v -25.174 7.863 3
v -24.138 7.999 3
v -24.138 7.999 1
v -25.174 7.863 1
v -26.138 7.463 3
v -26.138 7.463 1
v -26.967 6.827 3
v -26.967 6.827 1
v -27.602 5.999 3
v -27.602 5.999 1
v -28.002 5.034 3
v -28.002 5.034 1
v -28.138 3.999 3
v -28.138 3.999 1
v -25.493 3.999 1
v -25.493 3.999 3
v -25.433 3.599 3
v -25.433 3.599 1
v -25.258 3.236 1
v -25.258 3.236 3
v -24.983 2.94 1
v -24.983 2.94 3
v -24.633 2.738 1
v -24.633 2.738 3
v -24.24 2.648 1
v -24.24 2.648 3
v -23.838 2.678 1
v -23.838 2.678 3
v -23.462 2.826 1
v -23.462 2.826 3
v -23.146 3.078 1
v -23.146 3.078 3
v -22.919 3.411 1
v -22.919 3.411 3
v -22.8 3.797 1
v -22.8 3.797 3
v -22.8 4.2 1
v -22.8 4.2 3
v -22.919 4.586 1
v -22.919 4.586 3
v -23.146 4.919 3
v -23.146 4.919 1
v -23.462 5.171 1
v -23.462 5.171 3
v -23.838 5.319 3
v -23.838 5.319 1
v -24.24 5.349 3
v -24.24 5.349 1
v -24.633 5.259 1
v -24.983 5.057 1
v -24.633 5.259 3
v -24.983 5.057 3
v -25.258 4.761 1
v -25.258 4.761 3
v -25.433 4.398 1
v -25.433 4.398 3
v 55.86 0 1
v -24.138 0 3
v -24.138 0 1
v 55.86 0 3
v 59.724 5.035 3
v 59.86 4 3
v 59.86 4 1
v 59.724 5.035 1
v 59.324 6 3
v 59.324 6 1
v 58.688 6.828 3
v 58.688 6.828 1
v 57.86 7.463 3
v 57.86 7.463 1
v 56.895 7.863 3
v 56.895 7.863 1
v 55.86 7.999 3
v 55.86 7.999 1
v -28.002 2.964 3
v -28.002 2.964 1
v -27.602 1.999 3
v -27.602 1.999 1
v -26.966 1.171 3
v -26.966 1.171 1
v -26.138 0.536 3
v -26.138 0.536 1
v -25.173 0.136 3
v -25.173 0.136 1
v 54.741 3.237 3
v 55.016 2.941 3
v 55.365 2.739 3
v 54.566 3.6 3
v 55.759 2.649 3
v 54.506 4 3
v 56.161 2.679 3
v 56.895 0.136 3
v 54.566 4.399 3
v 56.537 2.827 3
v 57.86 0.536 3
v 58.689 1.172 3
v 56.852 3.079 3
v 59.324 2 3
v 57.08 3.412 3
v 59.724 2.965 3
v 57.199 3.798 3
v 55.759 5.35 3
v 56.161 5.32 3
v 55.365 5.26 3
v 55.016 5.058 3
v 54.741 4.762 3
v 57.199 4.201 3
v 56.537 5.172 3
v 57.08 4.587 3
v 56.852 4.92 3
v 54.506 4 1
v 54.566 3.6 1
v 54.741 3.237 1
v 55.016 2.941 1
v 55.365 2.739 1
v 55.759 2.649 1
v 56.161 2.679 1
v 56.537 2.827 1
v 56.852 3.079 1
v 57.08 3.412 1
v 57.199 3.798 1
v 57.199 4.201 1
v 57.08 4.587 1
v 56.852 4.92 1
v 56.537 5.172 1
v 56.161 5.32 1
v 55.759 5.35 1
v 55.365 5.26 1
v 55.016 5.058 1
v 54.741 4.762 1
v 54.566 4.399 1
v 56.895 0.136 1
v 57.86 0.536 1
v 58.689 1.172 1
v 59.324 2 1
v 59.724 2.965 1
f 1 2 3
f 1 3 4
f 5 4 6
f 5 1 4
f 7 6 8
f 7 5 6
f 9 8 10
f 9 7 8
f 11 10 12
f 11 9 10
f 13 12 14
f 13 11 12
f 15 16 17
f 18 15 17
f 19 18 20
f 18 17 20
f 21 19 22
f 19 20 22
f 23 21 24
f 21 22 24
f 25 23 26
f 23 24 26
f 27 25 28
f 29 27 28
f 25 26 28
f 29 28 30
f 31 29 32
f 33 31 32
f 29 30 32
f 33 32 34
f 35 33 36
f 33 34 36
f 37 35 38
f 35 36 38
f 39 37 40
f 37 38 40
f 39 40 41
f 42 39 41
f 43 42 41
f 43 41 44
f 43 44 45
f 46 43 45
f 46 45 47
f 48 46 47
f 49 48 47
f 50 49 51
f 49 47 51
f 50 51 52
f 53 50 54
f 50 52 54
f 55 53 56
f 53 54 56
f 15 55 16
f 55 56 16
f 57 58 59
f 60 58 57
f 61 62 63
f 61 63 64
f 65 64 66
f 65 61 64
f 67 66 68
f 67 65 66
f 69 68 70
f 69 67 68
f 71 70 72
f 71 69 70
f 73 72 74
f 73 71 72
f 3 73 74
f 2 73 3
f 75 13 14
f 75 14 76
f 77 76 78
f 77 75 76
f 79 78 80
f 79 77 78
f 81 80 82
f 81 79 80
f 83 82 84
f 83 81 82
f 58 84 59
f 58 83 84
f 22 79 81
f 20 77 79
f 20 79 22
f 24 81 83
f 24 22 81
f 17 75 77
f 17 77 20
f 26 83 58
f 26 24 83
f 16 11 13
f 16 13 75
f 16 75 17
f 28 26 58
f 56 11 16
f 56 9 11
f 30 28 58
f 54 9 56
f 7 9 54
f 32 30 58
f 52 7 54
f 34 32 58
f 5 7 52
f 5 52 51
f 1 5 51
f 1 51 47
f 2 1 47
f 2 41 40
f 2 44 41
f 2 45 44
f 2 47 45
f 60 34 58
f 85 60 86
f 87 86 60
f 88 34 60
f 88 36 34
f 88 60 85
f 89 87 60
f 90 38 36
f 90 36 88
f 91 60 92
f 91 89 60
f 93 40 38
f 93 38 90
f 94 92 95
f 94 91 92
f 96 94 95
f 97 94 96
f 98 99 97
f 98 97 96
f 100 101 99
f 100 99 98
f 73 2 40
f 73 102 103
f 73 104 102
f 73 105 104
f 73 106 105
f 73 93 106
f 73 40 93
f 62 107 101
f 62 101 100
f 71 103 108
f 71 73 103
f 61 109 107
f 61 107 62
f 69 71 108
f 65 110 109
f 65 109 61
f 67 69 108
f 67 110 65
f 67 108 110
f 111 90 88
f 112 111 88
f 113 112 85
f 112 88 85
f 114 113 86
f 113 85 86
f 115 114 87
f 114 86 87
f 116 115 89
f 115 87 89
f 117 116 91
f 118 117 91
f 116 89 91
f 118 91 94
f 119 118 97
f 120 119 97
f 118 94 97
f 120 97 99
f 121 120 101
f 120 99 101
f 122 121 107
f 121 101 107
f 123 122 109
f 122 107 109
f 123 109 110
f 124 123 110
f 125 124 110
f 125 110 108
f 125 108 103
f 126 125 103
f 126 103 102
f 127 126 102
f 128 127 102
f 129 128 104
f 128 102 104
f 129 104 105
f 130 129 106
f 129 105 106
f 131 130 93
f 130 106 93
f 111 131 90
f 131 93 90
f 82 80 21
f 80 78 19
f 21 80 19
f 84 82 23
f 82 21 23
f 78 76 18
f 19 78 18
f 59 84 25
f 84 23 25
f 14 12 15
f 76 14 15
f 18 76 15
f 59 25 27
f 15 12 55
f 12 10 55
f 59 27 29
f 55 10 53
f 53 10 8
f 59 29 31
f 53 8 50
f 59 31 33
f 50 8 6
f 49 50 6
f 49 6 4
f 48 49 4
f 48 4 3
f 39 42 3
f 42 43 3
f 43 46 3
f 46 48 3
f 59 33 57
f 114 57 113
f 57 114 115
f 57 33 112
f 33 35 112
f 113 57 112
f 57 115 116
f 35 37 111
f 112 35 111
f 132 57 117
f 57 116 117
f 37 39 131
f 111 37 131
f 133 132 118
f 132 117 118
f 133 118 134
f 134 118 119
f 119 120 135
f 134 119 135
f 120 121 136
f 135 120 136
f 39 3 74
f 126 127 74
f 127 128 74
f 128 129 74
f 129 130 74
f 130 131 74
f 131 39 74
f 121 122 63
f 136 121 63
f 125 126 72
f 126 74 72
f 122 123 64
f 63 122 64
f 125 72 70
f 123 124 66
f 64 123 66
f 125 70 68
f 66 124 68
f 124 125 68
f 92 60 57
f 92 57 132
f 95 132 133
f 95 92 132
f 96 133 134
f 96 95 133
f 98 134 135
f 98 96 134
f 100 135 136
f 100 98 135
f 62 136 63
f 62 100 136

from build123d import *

# Parameters (mm, degrees)
SKETCH_1_R      = 1.354010502
EXTRUDE_1_DEPTH = 2


with BuildPart() as part:
    # 草图1 → 凸台-拉伸1 (new body)
    with BuildSketch(Plane.XY.offset(3)):
        with BuildLine():
            Line((55.860222099, 7.999), (-24.138320535, 7.999))
            ThreePointArc((-24.138320535, 7.999), (-26.96674766, 6.827427125), (-28.138320535, 3.999))
            ThreePointArc((-28.138320535, 3.999), (-26.966394209, 1.171219344), (-24.13832066, 0))
            Line((-24.13832066, 0), (55.860221974, 0))
            ThreePointArc((55.860221974, 0), (58.688649099, 1.171572875), (59.860221974, 4))
            ThreePointArc((59.860221974, 4), (58.688295648, 6.827780656), (55.860222099, 7.999))
        make_face()
        with Locations(Location((55.859733508, 3.999511534, 0), (0, 0, 180))):
            Circle(SKETCH_1_R, mode=Mode.SUBTRACT)
        with Locations(Location((-24.138809001, 3.998511534, 0), (0, 0, 180))):
            Circle(SKETCH_1_R, mode=Mode.SUBTRACT)
    extrude(amount=-EXTRUDE_1_DEPTH)


solid = part.part
